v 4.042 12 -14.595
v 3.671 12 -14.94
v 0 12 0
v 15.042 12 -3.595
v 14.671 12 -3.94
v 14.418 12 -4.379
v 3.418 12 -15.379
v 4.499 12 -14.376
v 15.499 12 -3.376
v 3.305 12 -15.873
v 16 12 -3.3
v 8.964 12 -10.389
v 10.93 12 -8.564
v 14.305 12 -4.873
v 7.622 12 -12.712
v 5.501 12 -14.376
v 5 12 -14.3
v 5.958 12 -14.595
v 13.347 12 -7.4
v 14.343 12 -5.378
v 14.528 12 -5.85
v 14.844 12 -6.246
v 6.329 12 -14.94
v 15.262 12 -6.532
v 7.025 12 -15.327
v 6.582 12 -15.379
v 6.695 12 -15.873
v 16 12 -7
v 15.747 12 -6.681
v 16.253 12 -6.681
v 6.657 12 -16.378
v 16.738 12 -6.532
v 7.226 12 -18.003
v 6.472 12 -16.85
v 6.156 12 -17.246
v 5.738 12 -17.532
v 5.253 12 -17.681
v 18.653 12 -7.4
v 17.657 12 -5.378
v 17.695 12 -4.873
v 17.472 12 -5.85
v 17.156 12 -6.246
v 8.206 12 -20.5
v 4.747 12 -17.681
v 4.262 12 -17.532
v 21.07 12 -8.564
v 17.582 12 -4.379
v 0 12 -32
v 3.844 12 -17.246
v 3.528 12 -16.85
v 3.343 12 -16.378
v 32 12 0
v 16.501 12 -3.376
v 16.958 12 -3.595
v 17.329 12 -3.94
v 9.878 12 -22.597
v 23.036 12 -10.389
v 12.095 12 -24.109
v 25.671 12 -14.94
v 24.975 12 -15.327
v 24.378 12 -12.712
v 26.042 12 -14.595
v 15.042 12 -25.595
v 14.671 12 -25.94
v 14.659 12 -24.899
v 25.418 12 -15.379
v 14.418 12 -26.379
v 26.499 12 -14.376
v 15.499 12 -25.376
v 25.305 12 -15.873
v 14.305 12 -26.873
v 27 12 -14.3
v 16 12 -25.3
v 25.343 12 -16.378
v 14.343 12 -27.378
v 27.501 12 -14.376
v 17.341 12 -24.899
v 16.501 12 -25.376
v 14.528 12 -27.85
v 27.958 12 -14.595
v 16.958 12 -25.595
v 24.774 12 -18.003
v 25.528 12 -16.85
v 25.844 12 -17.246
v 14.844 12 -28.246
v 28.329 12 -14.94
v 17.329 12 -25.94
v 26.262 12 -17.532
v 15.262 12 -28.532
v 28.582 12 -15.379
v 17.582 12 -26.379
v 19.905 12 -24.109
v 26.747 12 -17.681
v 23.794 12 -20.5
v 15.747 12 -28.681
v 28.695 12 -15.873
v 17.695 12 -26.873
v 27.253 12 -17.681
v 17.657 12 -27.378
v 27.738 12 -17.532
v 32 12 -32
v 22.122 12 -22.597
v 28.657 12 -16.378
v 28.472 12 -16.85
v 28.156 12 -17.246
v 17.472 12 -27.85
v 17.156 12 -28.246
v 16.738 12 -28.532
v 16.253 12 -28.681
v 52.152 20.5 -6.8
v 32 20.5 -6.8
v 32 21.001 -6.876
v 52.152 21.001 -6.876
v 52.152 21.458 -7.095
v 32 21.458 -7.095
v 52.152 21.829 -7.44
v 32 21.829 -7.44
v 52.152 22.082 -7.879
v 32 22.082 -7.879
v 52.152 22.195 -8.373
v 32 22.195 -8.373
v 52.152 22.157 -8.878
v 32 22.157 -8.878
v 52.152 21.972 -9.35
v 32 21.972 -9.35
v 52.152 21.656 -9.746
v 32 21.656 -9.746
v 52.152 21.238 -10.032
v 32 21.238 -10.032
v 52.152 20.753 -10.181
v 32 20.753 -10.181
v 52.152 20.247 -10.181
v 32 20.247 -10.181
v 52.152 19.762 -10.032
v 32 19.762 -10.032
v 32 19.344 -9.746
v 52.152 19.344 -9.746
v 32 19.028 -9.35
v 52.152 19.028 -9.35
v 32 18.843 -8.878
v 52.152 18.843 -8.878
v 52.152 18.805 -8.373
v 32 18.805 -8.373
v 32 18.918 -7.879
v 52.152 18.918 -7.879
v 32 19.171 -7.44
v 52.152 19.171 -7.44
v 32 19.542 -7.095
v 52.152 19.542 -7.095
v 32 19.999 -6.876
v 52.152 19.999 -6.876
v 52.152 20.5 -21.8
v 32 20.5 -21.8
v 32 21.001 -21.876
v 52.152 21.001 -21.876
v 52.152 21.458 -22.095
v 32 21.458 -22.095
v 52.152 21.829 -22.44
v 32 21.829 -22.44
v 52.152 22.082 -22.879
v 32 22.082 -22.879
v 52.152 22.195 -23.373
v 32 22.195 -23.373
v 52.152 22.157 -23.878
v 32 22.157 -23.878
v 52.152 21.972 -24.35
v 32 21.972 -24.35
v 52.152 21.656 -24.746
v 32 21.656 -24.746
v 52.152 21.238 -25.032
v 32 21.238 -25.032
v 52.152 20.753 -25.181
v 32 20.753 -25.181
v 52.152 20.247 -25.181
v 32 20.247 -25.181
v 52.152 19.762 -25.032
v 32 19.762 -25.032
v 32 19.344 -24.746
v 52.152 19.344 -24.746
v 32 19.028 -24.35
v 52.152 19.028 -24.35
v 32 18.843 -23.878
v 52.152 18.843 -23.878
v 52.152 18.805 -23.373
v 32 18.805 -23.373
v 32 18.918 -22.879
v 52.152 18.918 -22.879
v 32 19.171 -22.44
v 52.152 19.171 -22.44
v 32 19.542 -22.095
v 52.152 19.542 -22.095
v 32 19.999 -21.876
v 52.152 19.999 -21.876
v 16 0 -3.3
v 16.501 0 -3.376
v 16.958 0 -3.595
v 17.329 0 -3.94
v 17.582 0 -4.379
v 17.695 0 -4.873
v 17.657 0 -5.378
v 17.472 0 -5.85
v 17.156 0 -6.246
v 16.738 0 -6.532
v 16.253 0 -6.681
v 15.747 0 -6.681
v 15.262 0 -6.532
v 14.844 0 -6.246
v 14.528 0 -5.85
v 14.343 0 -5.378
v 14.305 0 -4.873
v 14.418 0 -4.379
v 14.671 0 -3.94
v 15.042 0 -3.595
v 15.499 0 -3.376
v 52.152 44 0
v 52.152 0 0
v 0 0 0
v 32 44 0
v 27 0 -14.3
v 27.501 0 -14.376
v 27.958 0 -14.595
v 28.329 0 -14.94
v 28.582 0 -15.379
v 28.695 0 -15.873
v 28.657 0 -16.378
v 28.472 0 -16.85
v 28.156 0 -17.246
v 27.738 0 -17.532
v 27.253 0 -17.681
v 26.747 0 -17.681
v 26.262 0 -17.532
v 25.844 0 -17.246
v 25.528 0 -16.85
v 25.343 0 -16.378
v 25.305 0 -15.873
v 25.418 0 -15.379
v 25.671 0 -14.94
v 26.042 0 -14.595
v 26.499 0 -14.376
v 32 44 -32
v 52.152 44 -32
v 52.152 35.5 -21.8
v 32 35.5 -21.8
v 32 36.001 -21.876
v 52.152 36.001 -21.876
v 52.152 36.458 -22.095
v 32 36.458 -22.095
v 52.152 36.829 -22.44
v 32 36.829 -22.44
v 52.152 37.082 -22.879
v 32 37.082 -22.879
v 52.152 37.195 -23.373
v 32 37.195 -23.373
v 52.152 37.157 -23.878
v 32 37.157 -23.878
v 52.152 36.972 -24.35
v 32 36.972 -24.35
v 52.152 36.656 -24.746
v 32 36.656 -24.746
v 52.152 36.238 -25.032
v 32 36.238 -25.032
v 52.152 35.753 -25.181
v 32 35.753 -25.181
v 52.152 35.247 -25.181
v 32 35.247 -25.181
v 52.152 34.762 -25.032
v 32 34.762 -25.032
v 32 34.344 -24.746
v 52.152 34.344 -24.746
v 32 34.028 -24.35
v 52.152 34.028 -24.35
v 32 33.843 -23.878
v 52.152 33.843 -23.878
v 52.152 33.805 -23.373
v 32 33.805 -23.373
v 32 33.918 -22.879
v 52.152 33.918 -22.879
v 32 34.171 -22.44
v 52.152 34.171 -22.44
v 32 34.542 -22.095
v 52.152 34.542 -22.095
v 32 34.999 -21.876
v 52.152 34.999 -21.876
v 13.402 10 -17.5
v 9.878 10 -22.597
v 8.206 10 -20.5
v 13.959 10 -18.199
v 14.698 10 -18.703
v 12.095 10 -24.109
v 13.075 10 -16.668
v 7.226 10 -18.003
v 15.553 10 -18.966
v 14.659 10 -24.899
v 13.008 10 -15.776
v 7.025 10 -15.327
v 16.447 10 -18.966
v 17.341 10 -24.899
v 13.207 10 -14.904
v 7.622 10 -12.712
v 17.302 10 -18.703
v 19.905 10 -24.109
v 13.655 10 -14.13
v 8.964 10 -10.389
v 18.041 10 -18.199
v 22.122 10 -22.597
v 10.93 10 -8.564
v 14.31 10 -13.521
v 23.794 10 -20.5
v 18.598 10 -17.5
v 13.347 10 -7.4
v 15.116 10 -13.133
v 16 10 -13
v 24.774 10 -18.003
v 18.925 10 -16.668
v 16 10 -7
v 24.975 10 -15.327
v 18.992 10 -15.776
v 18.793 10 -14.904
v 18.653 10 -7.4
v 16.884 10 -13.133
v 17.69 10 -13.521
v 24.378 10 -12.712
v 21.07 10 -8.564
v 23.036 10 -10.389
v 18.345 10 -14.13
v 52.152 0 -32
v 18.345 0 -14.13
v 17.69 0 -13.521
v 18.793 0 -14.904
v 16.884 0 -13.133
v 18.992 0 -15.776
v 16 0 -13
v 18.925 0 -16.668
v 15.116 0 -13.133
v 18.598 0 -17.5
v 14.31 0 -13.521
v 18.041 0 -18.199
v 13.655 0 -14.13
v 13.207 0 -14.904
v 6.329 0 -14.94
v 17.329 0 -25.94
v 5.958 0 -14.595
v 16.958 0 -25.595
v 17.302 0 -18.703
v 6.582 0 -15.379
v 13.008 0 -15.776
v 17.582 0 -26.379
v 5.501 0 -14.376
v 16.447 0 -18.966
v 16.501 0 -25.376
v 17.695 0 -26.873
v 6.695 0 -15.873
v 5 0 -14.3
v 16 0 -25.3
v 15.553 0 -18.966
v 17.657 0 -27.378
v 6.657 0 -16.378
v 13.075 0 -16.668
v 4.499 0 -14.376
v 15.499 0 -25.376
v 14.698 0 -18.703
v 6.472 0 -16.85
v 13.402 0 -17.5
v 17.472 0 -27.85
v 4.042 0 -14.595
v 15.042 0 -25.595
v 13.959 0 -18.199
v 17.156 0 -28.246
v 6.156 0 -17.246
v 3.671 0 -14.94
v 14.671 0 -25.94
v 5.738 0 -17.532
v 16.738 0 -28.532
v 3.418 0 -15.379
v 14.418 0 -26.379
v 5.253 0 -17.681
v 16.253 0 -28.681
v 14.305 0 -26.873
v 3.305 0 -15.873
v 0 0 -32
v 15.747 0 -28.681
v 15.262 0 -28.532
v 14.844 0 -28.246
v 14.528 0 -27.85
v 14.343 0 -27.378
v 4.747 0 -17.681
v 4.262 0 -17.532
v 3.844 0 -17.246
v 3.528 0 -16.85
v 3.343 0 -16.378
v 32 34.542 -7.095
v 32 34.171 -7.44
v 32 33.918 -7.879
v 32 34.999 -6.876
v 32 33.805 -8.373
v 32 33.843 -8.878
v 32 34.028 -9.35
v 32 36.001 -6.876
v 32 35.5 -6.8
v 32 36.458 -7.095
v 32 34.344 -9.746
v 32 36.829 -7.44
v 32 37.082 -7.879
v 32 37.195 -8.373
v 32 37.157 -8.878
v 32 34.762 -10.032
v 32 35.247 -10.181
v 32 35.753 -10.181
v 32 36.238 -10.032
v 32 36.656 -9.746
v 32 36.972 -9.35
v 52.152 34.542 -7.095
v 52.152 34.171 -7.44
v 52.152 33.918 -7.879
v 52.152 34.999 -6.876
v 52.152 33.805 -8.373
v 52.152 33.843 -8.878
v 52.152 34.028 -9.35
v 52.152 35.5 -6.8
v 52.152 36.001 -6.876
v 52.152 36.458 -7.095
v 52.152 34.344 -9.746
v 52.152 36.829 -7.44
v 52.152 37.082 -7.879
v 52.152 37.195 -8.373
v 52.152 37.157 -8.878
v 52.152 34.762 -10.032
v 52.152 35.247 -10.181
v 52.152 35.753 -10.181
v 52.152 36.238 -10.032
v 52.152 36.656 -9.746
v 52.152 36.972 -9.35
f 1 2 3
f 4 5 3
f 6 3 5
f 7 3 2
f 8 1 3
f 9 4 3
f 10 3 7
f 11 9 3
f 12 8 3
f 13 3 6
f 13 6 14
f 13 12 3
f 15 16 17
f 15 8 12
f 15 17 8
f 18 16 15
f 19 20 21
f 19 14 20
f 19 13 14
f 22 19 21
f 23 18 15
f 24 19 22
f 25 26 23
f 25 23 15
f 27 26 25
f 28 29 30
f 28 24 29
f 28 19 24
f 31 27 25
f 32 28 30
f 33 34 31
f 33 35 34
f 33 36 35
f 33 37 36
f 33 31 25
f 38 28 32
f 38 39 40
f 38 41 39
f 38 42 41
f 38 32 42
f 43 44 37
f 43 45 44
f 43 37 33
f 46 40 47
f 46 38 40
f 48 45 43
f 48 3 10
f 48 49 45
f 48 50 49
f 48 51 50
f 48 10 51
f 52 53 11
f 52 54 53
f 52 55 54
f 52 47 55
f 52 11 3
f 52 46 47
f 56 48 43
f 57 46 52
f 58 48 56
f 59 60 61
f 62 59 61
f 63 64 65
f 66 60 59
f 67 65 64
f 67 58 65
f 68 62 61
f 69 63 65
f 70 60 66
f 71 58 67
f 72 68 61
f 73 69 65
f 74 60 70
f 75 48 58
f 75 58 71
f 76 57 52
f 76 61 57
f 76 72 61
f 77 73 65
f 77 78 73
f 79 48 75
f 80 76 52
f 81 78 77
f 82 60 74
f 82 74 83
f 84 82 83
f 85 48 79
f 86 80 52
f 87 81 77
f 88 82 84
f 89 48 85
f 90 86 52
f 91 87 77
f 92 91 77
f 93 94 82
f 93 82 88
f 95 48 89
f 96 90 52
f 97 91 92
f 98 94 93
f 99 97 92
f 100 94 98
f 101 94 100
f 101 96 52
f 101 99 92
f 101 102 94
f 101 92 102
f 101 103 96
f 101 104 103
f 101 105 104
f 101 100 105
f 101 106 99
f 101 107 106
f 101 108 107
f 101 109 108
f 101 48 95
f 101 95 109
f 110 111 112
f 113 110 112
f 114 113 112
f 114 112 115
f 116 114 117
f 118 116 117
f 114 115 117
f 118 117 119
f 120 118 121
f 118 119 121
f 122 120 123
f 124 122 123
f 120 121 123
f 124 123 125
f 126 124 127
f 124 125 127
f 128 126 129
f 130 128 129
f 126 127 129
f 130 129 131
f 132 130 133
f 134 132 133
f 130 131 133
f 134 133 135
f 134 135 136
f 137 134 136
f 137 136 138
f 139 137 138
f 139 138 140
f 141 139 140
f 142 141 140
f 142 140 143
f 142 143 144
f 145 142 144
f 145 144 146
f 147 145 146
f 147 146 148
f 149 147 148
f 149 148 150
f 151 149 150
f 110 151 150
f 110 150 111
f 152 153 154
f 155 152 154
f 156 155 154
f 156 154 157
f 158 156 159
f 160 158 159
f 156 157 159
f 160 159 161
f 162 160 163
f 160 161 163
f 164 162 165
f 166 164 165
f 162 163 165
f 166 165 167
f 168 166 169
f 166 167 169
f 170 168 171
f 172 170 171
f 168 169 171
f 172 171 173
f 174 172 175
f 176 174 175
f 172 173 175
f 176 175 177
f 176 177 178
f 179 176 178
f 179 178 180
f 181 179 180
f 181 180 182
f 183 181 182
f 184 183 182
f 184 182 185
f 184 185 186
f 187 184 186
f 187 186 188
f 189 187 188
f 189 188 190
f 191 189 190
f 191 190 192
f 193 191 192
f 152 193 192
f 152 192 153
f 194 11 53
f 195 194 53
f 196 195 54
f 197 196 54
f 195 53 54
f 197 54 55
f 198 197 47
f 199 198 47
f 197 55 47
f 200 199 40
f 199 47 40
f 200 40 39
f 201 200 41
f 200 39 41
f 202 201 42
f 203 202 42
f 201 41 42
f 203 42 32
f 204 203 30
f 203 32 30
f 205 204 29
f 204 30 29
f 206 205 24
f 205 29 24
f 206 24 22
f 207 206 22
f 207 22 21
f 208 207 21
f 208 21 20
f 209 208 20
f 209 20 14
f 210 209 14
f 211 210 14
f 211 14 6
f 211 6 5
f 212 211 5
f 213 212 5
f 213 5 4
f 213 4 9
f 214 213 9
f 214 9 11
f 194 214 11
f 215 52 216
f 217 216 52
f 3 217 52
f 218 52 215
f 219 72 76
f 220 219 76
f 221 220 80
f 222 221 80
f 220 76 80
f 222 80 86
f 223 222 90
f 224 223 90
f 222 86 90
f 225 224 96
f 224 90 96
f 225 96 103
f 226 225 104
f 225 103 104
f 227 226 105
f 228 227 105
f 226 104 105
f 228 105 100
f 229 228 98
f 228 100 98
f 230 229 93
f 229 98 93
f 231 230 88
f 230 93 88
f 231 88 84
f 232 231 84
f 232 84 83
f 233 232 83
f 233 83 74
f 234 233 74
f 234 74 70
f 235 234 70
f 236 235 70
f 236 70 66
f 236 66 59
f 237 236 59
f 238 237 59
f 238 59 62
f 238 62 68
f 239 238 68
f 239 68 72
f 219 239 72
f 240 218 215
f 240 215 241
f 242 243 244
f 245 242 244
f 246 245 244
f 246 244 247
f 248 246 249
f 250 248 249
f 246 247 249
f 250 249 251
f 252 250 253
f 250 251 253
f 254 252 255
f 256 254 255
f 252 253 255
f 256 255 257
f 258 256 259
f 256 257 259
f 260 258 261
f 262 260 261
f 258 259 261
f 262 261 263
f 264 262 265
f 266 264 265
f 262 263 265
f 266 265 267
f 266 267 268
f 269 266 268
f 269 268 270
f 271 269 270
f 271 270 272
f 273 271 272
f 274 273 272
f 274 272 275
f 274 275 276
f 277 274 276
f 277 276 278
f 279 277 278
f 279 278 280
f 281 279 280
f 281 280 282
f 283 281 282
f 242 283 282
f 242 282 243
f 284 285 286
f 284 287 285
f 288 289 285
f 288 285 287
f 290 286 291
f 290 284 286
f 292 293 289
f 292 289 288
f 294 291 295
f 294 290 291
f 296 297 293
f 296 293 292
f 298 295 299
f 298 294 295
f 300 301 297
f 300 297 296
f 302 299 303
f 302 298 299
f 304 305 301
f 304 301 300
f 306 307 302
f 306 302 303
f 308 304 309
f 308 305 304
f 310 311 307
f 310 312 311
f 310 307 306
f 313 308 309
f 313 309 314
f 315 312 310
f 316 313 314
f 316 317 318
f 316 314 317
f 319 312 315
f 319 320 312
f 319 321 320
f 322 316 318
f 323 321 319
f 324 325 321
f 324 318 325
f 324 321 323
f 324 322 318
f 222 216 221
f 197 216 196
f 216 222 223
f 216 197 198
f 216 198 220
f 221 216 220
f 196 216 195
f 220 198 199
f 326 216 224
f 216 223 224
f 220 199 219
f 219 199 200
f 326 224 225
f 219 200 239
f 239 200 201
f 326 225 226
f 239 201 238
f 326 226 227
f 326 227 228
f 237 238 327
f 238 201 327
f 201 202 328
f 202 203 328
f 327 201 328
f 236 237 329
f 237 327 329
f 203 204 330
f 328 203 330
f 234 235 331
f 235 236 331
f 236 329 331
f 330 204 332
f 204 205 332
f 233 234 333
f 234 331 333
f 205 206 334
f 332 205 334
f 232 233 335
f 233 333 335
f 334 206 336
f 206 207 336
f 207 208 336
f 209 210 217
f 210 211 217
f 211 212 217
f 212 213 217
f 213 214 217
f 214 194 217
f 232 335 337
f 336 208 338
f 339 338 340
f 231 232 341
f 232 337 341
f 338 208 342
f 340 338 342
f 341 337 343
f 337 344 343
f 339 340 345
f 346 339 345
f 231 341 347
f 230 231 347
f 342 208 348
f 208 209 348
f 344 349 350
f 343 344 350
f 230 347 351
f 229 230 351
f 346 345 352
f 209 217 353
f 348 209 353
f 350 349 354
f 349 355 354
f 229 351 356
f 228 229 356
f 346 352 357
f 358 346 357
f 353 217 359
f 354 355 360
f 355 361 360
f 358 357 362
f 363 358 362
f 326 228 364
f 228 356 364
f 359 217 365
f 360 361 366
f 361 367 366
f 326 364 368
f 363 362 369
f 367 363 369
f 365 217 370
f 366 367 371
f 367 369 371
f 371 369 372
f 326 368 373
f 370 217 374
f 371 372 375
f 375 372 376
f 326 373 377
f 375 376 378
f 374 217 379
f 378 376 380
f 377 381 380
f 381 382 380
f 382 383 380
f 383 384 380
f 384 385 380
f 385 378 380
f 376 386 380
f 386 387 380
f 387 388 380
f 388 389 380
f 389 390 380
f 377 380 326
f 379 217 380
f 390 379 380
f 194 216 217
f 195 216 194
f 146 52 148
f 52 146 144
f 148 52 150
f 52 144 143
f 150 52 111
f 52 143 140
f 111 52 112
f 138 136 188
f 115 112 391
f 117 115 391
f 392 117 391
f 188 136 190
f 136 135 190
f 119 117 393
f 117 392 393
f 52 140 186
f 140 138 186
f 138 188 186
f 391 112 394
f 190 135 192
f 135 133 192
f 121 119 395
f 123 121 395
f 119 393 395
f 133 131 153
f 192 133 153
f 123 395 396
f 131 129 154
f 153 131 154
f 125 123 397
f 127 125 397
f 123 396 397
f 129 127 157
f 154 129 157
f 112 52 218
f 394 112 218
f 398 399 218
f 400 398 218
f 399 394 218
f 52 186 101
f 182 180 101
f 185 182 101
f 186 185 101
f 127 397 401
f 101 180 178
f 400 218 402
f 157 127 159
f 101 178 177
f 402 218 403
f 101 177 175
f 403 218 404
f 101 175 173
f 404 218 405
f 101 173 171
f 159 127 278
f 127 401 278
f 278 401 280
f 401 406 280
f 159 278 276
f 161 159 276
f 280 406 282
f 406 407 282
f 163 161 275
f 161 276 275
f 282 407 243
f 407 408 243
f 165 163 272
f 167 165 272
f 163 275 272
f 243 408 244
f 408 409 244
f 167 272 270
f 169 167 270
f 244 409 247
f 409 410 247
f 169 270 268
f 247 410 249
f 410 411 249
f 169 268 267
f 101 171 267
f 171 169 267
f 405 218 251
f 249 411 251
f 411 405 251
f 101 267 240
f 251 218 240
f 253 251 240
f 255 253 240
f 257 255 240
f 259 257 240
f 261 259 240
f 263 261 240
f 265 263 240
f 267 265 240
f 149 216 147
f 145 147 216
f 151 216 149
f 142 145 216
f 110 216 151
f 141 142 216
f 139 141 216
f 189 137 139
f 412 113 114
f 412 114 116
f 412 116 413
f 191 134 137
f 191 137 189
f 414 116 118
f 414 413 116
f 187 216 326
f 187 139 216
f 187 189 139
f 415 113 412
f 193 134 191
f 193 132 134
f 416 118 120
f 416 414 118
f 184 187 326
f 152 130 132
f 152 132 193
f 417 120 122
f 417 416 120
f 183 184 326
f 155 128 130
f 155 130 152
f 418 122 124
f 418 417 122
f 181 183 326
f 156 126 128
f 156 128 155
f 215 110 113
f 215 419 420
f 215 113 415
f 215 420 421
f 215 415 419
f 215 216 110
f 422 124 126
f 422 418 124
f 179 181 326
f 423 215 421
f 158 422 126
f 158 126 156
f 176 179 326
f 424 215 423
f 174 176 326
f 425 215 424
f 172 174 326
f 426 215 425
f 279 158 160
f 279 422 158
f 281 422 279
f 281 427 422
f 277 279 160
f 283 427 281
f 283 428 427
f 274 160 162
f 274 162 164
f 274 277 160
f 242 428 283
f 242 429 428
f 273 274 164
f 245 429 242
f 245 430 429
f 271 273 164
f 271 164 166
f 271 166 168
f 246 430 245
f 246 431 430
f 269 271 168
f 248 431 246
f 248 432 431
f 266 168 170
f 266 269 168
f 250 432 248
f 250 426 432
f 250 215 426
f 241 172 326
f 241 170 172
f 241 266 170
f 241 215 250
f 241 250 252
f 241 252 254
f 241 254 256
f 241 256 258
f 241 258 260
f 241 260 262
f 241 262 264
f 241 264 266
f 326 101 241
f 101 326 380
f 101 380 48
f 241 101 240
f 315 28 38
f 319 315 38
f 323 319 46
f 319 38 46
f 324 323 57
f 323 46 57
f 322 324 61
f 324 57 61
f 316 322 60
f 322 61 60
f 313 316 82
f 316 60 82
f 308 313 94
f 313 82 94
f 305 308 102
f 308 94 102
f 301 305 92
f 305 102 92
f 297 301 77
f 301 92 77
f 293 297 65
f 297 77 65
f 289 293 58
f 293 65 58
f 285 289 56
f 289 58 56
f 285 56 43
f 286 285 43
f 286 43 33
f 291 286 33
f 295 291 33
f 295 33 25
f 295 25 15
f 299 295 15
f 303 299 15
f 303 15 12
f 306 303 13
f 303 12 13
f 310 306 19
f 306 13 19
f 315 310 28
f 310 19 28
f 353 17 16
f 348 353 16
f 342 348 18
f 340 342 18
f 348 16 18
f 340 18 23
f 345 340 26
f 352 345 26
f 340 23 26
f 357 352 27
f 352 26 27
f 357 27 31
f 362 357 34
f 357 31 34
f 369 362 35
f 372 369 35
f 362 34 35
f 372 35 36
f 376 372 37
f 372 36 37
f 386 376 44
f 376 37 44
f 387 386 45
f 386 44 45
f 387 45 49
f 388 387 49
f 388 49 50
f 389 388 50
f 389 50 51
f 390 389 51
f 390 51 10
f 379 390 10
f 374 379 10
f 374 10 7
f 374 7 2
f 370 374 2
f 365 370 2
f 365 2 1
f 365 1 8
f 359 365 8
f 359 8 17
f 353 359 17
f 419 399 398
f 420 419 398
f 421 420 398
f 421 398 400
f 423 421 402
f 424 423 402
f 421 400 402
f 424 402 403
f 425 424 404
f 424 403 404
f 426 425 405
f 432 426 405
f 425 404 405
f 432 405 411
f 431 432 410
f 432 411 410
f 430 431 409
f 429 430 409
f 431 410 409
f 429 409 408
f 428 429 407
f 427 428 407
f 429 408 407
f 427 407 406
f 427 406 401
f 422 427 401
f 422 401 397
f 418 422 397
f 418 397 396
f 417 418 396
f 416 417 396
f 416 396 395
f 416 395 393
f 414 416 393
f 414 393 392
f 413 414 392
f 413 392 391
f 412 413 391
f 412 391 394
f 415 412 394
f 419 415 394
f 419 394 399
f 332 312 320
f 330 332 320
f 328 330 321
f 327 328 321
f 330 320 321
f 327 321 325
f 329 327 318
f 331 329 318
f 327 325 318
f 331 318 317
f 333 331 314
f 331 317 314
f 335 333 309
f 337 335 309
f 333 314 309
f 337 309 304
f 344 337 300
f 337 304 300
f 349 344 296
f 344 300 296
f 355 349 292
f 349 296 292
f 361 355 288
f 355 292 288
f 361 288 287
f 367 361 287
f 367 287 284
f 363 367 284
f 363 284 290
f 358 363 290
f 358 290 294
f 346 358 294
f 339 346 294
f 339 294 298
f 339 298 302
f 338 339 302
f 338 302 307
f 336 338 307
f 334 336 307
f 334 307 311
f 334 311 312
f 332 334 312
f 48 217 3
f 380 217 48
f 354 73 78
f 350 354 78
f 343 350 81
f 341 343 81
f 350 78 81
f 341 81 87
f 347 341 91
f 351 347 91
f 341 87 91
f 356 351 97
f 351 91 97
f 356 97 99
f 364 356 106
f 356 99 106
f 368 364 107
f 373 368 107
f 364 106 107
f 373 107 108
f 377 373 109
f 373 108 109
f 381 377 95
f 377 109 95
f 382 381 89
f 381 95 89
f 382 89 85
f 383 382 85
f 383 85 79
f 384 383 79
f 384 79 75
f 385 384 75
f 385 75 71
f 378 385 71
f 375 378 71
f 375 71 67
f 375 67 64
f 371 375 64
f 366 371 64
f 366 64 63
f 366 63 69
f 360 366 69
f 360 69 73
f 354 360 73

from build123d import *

# Parameters (mm, degrees)
SKETCH1_W           = 32
SKETCH1_H           = 32
BOSS_EXTRUDE1_DEPTH = 12
SKETCH3_R           = 9
CUT_EXTRUDE1_DEPTH  = 2
SKETCH5_R           = 3
CUT_EXTRUDE2_DEPTH  = 47.346520905
SKETCH6_R           = 1.7
CUT_EXTRUDE3_DEPTH  = 47.818799643
SKETCH7_W           = 32
SKETCH7_H           = 44
BOSS_EXTRUDE3_DEPTH = 20.152172572
SKETCH8_R           = 1.7
CUT_EXTRUDE4_DEPTH  = 64.118935352


with BuildPart() as part:
    # Sketch1 → Boss-Extrude1 (new body)
    with BuildSketch(Plane(origin=(0, 0, 0), x_dir=(1, 0, 0), z_dir=(0, 1, 0))):
        with Locations((16, 16)):
            Rectangle(SKETCH1_W, SKETCH1_H)
    extrude(amount=BOSS_EXTRUDE1_DEPTH)

    # Sketch3 → Cut-Extrude1 (cut)
    with BuildSketch(Plane(origin=(0, 12, 0), x_dir=(1, 0, 0), z_dir=(0, 1, 0))):
        with Locations(Location((16, 16, 0), (0, 0, 270))):
            Circle(SKETCH3_R)
    extrude(amount=-CUT_EXTRUDE1_DEPTH, mode=Mode.SUBTRACT)

    # Sketch5 → Cut-Extrude2 (cut, through all)
    with BuildSketch(Plane(origin=(0, 10, 0), x_dir=(1, 0, 0), z_dir=(0, 1, 0))):
        with Locations(Location((16, 16, 0), (0, 0, 270))):
            Circle(SKETCH5_R)
    extrude(amount=-CUT_EXTRUDE2_DEPTH, mode=Mode.SUBTRACT)

    # Sketch6 → Cut-Extrude3 (cut, through all)
    with BuildSketch(Plane(origin=(0, 12, 0), x_dir=(1, 0, 0), z_dir=(0, 1, 0))):
        with Locations(Location((16, 27, 0), (0, 0, 270))):
            Circle(SKETCH6_R)
        with Locations(Location((5, 16, 0), (0, 0, 270))):
            Circle(SKETCH6_R)
        with Locations(Location((16, 5, 0), (0, 0, 270))):
            Circle(SKETCH6_R)
        with Locations(Location((27, 16, 0), (0, 0, 270))):
            Circle(SKETCH6_R)
    extrude(amount=-CUT_EXTRUDE3_DEPTH, mode=Mode.SUBTRACT)

    # Sketch7 → Boss-Extrude3 (add)
    with BuildSketch(Plane(origin=(32, 0, 0), x_dir=(0, 0, -1), z_dir=(1, 0, 0))):
        with Locations((16, 22)):
            Rectangle(SKETCH7_W, SKETCH7_H)
    extrude(amount=BOSS_EXTRUDE3_DEPTH)

    # Sketch8 → Cut-Extrude4 (cut, through all)
    with BuildSketch(Plane.ZY.offset(-32)):
        with Locations((-23.5, 35.5)):
            Circle(SKETCH8_R)
        with Locations((-8.5, 35.5)):
            Circle(SKETCH8_R)
        with Locations((-8.5, 20.5)):
            Circle(SKETCH8_R)
        with Locations((-23.5, 20.5)):
            Circle(SKETCH8_R)
    extrude(amount=-CUT_EXTRUDE4_DEPTH, mode=Mode.SUBTRACT)


solid = part.part
